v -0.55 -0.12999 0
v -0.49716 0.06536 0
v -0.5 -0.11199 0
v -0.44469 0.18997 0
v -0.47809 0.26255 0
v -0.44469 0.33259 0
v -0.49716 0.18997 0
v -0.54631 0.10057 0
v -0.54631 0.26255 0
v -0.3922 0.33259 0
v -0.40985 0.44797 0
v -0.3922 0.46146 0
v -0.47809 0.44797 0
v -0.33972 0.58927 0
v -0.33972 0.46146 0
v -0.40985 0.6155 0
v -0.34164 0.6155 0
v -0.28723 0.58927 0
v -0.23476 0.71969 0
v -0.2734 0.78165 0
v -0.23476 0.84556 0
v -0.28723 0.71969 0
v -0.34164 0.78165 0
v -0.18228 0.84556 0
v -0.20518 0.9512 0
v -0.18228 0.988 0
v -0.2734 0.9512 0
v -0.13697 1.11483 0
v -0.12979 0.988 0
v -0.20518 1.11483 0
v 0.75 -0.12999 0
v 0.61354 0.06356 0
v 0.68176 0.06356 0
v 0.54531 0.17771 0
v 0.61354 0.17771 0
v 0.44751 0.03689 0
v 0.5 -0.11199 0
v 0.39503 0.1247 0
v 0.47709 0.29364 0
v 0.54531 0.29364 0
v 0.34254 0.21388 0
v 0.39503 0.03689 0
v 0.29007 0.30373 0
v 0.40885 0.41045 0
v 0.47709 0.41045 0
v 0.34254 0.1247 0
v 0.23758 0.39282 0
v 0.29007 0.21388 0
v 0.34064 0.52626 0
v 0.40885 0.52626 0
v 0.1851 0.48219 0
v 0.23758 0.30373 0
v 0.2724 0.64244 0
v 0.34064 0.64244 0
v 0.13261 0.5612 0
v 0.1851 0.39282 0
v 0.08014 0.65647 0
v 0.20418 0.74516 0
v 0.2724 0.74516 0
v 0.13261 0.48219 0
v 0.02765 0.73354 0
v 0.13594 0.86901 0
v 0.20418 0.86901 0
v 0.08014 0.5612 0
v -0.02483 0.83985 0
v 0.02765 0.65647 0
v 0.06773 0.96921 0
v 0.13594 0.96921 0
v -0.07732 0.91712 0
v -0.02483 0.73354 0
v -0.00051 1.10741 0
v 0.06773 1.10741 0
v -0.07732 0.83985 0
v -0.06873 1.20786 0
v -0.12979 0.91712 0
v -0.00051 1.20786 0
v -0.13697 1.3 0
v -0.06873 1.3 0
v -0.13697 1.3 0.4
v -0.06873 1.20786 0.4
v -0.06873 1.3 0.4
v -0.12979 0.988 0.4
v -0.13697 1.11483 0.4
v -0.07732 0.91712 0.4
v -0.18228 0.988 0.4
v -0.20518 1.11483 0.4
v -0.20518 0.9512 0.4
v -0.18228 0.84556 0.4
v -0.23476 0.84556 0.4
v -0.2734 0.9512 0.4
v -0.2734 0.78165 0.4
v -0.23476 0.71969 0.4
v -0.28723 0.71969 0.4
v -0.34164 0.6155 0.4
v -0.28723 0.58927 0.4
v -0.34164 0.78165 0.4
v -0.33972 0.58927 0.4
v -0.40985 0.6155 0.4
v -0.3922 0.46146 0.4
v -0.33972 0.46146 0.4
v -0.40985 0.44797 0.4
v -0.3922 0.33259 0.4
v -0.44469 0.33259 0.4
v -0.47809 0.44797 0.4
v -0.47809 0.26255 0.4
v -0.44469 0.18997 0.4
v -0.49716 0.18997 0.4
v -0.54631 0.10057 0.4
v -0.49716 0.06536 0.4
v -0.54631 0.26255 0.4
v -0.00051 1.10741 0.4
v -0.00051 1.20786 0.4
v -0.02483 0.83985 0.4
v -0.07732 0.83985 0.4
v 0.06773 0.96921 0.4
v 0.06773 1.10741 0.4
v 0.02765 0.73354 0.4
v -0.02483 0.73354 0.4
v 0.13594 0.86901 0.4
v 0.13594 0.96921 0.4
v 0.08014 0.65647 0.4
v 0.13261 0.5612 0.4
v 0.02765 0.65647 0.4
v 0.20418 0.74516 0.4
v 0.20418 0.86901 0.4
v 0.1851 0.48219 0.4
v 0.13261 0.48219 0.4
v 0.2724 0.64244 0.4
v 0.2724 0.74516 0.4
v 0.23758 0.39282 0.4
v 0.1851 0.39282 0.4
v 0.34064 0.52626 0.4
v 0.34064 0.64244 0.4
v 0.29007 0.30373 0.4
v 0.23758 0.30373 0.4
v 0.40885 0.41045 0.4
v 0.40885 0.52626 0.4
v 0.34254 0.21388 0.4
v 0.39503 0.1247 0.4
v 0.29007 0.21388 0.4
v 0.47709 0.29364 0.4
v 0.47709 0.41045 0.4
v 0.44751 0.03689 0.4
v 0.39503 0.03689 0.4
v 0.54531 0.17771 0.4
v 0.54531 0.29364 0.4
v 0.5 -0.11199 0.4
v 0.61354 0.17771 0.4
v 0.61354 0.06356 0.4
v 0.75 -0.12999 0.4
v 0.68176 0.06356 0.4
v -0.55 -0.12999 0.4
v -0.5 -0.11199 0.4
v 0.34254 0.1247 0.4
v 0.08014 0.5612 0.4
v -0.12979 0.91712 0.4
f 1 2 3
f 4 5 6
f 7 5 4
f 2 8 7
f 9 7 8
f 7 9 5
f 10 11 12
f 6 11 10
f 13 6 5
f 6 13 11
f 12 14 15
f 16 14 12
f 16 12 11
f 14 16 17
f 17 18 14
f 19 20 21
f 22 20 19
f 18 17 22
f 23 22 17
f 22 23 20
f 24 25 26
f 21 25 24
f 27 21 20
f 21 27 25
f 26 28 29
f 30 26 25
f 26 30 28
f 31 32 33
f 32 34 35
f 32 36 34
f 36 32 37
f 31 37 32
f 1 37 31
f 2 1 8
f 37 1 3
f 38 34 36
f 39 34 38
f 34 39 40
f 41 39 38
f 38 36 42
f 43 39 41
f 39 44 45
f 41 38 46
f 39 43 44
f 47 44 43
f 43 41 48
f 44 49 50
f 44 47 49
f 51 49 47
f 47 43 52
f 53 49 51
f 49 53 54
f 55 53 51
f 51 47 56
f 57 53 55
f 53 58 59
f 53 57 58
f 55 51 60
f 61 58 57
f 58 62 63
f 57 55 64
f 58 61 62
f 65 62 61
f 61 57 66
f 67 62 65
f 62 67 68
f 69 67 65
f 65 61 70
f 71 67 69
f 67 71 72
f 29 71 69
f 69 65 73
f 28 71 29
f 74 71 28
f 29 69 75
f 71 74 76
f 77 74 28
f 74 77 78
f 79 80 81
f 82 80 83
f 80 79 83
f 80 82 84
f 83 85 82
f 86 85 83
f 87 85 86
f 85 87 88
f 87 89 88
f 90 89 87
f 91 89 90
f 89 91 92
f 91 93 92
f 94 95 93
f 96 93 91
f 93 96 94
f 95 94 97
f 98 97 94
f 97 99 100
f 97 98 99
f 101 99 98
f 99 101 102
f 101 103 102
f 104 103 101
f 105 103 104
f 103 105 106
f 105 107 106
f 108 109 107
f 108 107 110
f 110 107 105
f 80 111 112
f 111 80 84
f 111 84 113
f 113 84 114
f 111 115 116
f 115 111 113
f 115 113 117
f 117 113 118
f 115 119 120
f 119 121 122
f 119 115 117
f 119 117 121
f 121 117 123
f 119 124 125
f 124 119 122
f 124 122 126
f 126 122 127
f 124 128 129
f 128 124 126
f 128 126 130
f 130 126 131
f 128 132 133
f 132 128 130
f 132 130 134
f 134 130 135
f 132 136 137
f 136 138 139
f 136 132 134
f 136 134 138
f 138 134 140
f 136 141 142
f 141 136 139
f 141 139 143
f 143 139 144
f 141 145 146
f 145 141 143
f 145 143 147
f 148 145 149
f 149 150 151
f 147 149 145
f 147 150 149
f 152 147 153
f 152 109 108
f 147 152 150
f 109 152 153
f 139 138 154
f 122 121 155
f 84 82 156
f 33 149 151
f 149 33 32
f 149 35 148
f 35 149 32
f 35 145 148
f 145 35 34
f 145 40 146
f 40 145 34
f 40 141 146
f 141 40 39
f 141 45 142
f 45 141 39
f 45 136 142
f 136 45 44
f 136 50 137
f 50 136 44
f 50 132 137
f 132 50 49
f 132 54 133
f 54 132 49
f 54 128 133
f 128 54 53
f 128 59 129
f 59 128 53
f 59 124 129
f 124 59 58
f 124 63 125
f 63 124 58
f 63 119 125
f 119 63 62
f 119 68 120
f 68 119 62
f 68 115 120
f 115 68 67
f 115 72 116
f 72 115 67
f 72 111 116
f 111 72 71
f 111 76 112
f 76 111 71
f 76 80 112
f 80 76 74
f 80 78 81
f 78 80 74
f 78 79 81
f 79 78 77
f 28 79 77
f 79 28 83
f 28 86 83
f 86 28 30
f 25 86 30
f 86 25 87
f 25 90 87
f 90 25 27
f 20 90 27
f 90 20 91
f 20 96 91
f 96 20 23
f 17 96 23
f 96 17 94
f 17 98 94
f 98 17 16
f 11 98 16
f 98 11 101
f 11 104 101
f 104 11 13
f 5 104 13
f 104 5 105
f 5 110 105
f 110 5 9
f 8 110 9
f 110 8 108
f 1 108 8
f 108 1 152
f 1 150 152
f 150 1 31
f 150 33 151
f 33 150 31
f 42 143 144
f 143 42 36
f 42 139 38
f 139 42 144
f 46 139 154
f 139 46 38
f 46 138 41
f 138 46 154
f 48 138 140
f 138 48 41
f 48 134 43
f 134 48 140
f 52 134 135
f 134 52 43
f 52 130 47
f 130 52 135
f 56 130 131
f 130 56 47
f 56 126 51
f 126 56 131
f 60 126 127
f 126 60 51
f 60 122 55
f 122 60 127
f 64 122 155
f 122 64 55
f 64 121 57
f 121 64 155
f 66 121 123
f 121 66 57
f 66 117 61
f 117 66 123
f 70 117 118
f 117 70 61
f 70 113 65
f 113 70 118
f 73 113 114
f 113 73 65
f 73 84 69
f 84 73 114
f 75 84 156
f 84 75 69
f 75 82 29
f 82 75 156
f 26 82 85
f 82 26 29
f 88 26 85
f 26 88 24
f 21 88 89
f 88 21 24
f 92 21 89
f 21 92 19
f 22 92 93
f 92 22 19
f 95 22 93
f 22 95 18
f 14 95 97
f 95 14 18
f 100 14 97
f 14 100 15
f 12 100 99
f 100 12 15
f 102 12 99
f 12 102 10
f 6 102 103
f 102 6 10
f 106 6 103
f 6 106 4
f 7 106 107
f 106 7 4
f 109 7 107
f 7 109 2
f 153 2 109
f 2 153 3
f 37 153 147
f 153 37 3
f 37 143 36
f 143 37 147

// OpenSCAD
points = [
	[0, -0.1],
	[0.0028411864674448765, 0.07736250968241673],
	[0.0028411864674448765, 0.07736250968241673],
	[0.0028411864674448765, 0.2019752130131681],
	[0.05532322928494777, 0.2019752130131681],
	[0.05532322928494777, 0.3445972114639814],
	[0.10780527210245067, 0.3445972114639814],
	[0.10780527210245067, 0.47347017815646786],
	[0.16028731491995357, 0.47347017815646786],
	[0.16028731491995357, 0.6012780790085205],
	[0.21276935773745645, 0.6012780790085205],
	[0.21276935773745645, 0.7317002323780015],
	[0.2652514005549594, 0.7317002323780015],
	[0.2652514005549594, 0.857571649883811],
	[0.3177334433724623, 0.857571649883811],
	[0.3177334433724623, 1.0],
	[0.37021548618996514, 1.0],
	[0.37021548618996514, 0.929124709527498],
	[0.42269752900746804, 0.929124709527498],
	[0.42269752900746804, 0.8518590240123934],
	[0.47517957182497095, 0.8518590240123934],
	[0.47517957182497095, 0.7455460883036406],
	[0.527661614642474, 0.7455460883036406],
	[0.527661614642474, 0.6684740511231604],
	[0.5801436574599768, 0.6684740511231604],
	[0.5801436574599768, 0.5731990704879938],
	[0.6326257002774797, 0.5731990704879938],
	[0.6326257002774797, 0.4941905499612703],
	[0.6851077430949826, 0.4941905499612703],
	[0.6851077430949826, 0.4048218435321456],
	[0.7375897859124855, 0.4048218435321456],
	[0.7375897859124855, 0.3157436096049574],
	[0.7900718287299884, 0.3157436096049574],
	[0.7900718287299884, 0.22589078233927187],
	[0.8425538715474913, 0.22589078233927187],
	[0.8425538715474913, 0.1367157242447715],
	[0.8950359143649942, 0.1367157242447715],
	[0.8950359143649942, 0.048896204492641364],
	[0.9475179571824971, 0.048896204492641364],
	[1, -0.1],
	[0, -0.1]
];
difference(){
    
// OUTER COOKIE CUTTER SHAPE
    
    // extrude the outer polygon into a 3D shape
    // this extrusion is thinner than the inner shape to make sure the inner shape "cuts" through it completely
    linear_extrude(0.4)
    
        // x- and y-shift the outer polygon to be roughly centered around the inner shape
        // z-shift the outer polygon so the extruded inner shape cuts all the way through
        translate([-0.55, 0, -0.1])
            
            // scale this polygon up a bit to make an outer ring of a cookie cutter
            scale(1.3, 1.2, 1)
            
                // generate a polygon to become the outer shape
                polygon(points);        
    
// INNER COOKIE CUTTER SHAPE TO BE SUBTRACTED FROM OUTER

    // extrude the inner polygon into a 3D shape
    // this extrusion is thicker than the outer shape to ensure the inner shape "cuts" completey through the outer shape
    // the "scale" parameter grows the shape as it extrudes to give the finished cutter a narrower edge
    linear_extrude(0.6) 
    
        // x-shift the shape to 
        translate([-0.5, -0.012, 0]) //x-center the polygon at origin
            
            // generate a polygon to become the inner shape (this is effectively defining a hole)
            polygon(points);
}
